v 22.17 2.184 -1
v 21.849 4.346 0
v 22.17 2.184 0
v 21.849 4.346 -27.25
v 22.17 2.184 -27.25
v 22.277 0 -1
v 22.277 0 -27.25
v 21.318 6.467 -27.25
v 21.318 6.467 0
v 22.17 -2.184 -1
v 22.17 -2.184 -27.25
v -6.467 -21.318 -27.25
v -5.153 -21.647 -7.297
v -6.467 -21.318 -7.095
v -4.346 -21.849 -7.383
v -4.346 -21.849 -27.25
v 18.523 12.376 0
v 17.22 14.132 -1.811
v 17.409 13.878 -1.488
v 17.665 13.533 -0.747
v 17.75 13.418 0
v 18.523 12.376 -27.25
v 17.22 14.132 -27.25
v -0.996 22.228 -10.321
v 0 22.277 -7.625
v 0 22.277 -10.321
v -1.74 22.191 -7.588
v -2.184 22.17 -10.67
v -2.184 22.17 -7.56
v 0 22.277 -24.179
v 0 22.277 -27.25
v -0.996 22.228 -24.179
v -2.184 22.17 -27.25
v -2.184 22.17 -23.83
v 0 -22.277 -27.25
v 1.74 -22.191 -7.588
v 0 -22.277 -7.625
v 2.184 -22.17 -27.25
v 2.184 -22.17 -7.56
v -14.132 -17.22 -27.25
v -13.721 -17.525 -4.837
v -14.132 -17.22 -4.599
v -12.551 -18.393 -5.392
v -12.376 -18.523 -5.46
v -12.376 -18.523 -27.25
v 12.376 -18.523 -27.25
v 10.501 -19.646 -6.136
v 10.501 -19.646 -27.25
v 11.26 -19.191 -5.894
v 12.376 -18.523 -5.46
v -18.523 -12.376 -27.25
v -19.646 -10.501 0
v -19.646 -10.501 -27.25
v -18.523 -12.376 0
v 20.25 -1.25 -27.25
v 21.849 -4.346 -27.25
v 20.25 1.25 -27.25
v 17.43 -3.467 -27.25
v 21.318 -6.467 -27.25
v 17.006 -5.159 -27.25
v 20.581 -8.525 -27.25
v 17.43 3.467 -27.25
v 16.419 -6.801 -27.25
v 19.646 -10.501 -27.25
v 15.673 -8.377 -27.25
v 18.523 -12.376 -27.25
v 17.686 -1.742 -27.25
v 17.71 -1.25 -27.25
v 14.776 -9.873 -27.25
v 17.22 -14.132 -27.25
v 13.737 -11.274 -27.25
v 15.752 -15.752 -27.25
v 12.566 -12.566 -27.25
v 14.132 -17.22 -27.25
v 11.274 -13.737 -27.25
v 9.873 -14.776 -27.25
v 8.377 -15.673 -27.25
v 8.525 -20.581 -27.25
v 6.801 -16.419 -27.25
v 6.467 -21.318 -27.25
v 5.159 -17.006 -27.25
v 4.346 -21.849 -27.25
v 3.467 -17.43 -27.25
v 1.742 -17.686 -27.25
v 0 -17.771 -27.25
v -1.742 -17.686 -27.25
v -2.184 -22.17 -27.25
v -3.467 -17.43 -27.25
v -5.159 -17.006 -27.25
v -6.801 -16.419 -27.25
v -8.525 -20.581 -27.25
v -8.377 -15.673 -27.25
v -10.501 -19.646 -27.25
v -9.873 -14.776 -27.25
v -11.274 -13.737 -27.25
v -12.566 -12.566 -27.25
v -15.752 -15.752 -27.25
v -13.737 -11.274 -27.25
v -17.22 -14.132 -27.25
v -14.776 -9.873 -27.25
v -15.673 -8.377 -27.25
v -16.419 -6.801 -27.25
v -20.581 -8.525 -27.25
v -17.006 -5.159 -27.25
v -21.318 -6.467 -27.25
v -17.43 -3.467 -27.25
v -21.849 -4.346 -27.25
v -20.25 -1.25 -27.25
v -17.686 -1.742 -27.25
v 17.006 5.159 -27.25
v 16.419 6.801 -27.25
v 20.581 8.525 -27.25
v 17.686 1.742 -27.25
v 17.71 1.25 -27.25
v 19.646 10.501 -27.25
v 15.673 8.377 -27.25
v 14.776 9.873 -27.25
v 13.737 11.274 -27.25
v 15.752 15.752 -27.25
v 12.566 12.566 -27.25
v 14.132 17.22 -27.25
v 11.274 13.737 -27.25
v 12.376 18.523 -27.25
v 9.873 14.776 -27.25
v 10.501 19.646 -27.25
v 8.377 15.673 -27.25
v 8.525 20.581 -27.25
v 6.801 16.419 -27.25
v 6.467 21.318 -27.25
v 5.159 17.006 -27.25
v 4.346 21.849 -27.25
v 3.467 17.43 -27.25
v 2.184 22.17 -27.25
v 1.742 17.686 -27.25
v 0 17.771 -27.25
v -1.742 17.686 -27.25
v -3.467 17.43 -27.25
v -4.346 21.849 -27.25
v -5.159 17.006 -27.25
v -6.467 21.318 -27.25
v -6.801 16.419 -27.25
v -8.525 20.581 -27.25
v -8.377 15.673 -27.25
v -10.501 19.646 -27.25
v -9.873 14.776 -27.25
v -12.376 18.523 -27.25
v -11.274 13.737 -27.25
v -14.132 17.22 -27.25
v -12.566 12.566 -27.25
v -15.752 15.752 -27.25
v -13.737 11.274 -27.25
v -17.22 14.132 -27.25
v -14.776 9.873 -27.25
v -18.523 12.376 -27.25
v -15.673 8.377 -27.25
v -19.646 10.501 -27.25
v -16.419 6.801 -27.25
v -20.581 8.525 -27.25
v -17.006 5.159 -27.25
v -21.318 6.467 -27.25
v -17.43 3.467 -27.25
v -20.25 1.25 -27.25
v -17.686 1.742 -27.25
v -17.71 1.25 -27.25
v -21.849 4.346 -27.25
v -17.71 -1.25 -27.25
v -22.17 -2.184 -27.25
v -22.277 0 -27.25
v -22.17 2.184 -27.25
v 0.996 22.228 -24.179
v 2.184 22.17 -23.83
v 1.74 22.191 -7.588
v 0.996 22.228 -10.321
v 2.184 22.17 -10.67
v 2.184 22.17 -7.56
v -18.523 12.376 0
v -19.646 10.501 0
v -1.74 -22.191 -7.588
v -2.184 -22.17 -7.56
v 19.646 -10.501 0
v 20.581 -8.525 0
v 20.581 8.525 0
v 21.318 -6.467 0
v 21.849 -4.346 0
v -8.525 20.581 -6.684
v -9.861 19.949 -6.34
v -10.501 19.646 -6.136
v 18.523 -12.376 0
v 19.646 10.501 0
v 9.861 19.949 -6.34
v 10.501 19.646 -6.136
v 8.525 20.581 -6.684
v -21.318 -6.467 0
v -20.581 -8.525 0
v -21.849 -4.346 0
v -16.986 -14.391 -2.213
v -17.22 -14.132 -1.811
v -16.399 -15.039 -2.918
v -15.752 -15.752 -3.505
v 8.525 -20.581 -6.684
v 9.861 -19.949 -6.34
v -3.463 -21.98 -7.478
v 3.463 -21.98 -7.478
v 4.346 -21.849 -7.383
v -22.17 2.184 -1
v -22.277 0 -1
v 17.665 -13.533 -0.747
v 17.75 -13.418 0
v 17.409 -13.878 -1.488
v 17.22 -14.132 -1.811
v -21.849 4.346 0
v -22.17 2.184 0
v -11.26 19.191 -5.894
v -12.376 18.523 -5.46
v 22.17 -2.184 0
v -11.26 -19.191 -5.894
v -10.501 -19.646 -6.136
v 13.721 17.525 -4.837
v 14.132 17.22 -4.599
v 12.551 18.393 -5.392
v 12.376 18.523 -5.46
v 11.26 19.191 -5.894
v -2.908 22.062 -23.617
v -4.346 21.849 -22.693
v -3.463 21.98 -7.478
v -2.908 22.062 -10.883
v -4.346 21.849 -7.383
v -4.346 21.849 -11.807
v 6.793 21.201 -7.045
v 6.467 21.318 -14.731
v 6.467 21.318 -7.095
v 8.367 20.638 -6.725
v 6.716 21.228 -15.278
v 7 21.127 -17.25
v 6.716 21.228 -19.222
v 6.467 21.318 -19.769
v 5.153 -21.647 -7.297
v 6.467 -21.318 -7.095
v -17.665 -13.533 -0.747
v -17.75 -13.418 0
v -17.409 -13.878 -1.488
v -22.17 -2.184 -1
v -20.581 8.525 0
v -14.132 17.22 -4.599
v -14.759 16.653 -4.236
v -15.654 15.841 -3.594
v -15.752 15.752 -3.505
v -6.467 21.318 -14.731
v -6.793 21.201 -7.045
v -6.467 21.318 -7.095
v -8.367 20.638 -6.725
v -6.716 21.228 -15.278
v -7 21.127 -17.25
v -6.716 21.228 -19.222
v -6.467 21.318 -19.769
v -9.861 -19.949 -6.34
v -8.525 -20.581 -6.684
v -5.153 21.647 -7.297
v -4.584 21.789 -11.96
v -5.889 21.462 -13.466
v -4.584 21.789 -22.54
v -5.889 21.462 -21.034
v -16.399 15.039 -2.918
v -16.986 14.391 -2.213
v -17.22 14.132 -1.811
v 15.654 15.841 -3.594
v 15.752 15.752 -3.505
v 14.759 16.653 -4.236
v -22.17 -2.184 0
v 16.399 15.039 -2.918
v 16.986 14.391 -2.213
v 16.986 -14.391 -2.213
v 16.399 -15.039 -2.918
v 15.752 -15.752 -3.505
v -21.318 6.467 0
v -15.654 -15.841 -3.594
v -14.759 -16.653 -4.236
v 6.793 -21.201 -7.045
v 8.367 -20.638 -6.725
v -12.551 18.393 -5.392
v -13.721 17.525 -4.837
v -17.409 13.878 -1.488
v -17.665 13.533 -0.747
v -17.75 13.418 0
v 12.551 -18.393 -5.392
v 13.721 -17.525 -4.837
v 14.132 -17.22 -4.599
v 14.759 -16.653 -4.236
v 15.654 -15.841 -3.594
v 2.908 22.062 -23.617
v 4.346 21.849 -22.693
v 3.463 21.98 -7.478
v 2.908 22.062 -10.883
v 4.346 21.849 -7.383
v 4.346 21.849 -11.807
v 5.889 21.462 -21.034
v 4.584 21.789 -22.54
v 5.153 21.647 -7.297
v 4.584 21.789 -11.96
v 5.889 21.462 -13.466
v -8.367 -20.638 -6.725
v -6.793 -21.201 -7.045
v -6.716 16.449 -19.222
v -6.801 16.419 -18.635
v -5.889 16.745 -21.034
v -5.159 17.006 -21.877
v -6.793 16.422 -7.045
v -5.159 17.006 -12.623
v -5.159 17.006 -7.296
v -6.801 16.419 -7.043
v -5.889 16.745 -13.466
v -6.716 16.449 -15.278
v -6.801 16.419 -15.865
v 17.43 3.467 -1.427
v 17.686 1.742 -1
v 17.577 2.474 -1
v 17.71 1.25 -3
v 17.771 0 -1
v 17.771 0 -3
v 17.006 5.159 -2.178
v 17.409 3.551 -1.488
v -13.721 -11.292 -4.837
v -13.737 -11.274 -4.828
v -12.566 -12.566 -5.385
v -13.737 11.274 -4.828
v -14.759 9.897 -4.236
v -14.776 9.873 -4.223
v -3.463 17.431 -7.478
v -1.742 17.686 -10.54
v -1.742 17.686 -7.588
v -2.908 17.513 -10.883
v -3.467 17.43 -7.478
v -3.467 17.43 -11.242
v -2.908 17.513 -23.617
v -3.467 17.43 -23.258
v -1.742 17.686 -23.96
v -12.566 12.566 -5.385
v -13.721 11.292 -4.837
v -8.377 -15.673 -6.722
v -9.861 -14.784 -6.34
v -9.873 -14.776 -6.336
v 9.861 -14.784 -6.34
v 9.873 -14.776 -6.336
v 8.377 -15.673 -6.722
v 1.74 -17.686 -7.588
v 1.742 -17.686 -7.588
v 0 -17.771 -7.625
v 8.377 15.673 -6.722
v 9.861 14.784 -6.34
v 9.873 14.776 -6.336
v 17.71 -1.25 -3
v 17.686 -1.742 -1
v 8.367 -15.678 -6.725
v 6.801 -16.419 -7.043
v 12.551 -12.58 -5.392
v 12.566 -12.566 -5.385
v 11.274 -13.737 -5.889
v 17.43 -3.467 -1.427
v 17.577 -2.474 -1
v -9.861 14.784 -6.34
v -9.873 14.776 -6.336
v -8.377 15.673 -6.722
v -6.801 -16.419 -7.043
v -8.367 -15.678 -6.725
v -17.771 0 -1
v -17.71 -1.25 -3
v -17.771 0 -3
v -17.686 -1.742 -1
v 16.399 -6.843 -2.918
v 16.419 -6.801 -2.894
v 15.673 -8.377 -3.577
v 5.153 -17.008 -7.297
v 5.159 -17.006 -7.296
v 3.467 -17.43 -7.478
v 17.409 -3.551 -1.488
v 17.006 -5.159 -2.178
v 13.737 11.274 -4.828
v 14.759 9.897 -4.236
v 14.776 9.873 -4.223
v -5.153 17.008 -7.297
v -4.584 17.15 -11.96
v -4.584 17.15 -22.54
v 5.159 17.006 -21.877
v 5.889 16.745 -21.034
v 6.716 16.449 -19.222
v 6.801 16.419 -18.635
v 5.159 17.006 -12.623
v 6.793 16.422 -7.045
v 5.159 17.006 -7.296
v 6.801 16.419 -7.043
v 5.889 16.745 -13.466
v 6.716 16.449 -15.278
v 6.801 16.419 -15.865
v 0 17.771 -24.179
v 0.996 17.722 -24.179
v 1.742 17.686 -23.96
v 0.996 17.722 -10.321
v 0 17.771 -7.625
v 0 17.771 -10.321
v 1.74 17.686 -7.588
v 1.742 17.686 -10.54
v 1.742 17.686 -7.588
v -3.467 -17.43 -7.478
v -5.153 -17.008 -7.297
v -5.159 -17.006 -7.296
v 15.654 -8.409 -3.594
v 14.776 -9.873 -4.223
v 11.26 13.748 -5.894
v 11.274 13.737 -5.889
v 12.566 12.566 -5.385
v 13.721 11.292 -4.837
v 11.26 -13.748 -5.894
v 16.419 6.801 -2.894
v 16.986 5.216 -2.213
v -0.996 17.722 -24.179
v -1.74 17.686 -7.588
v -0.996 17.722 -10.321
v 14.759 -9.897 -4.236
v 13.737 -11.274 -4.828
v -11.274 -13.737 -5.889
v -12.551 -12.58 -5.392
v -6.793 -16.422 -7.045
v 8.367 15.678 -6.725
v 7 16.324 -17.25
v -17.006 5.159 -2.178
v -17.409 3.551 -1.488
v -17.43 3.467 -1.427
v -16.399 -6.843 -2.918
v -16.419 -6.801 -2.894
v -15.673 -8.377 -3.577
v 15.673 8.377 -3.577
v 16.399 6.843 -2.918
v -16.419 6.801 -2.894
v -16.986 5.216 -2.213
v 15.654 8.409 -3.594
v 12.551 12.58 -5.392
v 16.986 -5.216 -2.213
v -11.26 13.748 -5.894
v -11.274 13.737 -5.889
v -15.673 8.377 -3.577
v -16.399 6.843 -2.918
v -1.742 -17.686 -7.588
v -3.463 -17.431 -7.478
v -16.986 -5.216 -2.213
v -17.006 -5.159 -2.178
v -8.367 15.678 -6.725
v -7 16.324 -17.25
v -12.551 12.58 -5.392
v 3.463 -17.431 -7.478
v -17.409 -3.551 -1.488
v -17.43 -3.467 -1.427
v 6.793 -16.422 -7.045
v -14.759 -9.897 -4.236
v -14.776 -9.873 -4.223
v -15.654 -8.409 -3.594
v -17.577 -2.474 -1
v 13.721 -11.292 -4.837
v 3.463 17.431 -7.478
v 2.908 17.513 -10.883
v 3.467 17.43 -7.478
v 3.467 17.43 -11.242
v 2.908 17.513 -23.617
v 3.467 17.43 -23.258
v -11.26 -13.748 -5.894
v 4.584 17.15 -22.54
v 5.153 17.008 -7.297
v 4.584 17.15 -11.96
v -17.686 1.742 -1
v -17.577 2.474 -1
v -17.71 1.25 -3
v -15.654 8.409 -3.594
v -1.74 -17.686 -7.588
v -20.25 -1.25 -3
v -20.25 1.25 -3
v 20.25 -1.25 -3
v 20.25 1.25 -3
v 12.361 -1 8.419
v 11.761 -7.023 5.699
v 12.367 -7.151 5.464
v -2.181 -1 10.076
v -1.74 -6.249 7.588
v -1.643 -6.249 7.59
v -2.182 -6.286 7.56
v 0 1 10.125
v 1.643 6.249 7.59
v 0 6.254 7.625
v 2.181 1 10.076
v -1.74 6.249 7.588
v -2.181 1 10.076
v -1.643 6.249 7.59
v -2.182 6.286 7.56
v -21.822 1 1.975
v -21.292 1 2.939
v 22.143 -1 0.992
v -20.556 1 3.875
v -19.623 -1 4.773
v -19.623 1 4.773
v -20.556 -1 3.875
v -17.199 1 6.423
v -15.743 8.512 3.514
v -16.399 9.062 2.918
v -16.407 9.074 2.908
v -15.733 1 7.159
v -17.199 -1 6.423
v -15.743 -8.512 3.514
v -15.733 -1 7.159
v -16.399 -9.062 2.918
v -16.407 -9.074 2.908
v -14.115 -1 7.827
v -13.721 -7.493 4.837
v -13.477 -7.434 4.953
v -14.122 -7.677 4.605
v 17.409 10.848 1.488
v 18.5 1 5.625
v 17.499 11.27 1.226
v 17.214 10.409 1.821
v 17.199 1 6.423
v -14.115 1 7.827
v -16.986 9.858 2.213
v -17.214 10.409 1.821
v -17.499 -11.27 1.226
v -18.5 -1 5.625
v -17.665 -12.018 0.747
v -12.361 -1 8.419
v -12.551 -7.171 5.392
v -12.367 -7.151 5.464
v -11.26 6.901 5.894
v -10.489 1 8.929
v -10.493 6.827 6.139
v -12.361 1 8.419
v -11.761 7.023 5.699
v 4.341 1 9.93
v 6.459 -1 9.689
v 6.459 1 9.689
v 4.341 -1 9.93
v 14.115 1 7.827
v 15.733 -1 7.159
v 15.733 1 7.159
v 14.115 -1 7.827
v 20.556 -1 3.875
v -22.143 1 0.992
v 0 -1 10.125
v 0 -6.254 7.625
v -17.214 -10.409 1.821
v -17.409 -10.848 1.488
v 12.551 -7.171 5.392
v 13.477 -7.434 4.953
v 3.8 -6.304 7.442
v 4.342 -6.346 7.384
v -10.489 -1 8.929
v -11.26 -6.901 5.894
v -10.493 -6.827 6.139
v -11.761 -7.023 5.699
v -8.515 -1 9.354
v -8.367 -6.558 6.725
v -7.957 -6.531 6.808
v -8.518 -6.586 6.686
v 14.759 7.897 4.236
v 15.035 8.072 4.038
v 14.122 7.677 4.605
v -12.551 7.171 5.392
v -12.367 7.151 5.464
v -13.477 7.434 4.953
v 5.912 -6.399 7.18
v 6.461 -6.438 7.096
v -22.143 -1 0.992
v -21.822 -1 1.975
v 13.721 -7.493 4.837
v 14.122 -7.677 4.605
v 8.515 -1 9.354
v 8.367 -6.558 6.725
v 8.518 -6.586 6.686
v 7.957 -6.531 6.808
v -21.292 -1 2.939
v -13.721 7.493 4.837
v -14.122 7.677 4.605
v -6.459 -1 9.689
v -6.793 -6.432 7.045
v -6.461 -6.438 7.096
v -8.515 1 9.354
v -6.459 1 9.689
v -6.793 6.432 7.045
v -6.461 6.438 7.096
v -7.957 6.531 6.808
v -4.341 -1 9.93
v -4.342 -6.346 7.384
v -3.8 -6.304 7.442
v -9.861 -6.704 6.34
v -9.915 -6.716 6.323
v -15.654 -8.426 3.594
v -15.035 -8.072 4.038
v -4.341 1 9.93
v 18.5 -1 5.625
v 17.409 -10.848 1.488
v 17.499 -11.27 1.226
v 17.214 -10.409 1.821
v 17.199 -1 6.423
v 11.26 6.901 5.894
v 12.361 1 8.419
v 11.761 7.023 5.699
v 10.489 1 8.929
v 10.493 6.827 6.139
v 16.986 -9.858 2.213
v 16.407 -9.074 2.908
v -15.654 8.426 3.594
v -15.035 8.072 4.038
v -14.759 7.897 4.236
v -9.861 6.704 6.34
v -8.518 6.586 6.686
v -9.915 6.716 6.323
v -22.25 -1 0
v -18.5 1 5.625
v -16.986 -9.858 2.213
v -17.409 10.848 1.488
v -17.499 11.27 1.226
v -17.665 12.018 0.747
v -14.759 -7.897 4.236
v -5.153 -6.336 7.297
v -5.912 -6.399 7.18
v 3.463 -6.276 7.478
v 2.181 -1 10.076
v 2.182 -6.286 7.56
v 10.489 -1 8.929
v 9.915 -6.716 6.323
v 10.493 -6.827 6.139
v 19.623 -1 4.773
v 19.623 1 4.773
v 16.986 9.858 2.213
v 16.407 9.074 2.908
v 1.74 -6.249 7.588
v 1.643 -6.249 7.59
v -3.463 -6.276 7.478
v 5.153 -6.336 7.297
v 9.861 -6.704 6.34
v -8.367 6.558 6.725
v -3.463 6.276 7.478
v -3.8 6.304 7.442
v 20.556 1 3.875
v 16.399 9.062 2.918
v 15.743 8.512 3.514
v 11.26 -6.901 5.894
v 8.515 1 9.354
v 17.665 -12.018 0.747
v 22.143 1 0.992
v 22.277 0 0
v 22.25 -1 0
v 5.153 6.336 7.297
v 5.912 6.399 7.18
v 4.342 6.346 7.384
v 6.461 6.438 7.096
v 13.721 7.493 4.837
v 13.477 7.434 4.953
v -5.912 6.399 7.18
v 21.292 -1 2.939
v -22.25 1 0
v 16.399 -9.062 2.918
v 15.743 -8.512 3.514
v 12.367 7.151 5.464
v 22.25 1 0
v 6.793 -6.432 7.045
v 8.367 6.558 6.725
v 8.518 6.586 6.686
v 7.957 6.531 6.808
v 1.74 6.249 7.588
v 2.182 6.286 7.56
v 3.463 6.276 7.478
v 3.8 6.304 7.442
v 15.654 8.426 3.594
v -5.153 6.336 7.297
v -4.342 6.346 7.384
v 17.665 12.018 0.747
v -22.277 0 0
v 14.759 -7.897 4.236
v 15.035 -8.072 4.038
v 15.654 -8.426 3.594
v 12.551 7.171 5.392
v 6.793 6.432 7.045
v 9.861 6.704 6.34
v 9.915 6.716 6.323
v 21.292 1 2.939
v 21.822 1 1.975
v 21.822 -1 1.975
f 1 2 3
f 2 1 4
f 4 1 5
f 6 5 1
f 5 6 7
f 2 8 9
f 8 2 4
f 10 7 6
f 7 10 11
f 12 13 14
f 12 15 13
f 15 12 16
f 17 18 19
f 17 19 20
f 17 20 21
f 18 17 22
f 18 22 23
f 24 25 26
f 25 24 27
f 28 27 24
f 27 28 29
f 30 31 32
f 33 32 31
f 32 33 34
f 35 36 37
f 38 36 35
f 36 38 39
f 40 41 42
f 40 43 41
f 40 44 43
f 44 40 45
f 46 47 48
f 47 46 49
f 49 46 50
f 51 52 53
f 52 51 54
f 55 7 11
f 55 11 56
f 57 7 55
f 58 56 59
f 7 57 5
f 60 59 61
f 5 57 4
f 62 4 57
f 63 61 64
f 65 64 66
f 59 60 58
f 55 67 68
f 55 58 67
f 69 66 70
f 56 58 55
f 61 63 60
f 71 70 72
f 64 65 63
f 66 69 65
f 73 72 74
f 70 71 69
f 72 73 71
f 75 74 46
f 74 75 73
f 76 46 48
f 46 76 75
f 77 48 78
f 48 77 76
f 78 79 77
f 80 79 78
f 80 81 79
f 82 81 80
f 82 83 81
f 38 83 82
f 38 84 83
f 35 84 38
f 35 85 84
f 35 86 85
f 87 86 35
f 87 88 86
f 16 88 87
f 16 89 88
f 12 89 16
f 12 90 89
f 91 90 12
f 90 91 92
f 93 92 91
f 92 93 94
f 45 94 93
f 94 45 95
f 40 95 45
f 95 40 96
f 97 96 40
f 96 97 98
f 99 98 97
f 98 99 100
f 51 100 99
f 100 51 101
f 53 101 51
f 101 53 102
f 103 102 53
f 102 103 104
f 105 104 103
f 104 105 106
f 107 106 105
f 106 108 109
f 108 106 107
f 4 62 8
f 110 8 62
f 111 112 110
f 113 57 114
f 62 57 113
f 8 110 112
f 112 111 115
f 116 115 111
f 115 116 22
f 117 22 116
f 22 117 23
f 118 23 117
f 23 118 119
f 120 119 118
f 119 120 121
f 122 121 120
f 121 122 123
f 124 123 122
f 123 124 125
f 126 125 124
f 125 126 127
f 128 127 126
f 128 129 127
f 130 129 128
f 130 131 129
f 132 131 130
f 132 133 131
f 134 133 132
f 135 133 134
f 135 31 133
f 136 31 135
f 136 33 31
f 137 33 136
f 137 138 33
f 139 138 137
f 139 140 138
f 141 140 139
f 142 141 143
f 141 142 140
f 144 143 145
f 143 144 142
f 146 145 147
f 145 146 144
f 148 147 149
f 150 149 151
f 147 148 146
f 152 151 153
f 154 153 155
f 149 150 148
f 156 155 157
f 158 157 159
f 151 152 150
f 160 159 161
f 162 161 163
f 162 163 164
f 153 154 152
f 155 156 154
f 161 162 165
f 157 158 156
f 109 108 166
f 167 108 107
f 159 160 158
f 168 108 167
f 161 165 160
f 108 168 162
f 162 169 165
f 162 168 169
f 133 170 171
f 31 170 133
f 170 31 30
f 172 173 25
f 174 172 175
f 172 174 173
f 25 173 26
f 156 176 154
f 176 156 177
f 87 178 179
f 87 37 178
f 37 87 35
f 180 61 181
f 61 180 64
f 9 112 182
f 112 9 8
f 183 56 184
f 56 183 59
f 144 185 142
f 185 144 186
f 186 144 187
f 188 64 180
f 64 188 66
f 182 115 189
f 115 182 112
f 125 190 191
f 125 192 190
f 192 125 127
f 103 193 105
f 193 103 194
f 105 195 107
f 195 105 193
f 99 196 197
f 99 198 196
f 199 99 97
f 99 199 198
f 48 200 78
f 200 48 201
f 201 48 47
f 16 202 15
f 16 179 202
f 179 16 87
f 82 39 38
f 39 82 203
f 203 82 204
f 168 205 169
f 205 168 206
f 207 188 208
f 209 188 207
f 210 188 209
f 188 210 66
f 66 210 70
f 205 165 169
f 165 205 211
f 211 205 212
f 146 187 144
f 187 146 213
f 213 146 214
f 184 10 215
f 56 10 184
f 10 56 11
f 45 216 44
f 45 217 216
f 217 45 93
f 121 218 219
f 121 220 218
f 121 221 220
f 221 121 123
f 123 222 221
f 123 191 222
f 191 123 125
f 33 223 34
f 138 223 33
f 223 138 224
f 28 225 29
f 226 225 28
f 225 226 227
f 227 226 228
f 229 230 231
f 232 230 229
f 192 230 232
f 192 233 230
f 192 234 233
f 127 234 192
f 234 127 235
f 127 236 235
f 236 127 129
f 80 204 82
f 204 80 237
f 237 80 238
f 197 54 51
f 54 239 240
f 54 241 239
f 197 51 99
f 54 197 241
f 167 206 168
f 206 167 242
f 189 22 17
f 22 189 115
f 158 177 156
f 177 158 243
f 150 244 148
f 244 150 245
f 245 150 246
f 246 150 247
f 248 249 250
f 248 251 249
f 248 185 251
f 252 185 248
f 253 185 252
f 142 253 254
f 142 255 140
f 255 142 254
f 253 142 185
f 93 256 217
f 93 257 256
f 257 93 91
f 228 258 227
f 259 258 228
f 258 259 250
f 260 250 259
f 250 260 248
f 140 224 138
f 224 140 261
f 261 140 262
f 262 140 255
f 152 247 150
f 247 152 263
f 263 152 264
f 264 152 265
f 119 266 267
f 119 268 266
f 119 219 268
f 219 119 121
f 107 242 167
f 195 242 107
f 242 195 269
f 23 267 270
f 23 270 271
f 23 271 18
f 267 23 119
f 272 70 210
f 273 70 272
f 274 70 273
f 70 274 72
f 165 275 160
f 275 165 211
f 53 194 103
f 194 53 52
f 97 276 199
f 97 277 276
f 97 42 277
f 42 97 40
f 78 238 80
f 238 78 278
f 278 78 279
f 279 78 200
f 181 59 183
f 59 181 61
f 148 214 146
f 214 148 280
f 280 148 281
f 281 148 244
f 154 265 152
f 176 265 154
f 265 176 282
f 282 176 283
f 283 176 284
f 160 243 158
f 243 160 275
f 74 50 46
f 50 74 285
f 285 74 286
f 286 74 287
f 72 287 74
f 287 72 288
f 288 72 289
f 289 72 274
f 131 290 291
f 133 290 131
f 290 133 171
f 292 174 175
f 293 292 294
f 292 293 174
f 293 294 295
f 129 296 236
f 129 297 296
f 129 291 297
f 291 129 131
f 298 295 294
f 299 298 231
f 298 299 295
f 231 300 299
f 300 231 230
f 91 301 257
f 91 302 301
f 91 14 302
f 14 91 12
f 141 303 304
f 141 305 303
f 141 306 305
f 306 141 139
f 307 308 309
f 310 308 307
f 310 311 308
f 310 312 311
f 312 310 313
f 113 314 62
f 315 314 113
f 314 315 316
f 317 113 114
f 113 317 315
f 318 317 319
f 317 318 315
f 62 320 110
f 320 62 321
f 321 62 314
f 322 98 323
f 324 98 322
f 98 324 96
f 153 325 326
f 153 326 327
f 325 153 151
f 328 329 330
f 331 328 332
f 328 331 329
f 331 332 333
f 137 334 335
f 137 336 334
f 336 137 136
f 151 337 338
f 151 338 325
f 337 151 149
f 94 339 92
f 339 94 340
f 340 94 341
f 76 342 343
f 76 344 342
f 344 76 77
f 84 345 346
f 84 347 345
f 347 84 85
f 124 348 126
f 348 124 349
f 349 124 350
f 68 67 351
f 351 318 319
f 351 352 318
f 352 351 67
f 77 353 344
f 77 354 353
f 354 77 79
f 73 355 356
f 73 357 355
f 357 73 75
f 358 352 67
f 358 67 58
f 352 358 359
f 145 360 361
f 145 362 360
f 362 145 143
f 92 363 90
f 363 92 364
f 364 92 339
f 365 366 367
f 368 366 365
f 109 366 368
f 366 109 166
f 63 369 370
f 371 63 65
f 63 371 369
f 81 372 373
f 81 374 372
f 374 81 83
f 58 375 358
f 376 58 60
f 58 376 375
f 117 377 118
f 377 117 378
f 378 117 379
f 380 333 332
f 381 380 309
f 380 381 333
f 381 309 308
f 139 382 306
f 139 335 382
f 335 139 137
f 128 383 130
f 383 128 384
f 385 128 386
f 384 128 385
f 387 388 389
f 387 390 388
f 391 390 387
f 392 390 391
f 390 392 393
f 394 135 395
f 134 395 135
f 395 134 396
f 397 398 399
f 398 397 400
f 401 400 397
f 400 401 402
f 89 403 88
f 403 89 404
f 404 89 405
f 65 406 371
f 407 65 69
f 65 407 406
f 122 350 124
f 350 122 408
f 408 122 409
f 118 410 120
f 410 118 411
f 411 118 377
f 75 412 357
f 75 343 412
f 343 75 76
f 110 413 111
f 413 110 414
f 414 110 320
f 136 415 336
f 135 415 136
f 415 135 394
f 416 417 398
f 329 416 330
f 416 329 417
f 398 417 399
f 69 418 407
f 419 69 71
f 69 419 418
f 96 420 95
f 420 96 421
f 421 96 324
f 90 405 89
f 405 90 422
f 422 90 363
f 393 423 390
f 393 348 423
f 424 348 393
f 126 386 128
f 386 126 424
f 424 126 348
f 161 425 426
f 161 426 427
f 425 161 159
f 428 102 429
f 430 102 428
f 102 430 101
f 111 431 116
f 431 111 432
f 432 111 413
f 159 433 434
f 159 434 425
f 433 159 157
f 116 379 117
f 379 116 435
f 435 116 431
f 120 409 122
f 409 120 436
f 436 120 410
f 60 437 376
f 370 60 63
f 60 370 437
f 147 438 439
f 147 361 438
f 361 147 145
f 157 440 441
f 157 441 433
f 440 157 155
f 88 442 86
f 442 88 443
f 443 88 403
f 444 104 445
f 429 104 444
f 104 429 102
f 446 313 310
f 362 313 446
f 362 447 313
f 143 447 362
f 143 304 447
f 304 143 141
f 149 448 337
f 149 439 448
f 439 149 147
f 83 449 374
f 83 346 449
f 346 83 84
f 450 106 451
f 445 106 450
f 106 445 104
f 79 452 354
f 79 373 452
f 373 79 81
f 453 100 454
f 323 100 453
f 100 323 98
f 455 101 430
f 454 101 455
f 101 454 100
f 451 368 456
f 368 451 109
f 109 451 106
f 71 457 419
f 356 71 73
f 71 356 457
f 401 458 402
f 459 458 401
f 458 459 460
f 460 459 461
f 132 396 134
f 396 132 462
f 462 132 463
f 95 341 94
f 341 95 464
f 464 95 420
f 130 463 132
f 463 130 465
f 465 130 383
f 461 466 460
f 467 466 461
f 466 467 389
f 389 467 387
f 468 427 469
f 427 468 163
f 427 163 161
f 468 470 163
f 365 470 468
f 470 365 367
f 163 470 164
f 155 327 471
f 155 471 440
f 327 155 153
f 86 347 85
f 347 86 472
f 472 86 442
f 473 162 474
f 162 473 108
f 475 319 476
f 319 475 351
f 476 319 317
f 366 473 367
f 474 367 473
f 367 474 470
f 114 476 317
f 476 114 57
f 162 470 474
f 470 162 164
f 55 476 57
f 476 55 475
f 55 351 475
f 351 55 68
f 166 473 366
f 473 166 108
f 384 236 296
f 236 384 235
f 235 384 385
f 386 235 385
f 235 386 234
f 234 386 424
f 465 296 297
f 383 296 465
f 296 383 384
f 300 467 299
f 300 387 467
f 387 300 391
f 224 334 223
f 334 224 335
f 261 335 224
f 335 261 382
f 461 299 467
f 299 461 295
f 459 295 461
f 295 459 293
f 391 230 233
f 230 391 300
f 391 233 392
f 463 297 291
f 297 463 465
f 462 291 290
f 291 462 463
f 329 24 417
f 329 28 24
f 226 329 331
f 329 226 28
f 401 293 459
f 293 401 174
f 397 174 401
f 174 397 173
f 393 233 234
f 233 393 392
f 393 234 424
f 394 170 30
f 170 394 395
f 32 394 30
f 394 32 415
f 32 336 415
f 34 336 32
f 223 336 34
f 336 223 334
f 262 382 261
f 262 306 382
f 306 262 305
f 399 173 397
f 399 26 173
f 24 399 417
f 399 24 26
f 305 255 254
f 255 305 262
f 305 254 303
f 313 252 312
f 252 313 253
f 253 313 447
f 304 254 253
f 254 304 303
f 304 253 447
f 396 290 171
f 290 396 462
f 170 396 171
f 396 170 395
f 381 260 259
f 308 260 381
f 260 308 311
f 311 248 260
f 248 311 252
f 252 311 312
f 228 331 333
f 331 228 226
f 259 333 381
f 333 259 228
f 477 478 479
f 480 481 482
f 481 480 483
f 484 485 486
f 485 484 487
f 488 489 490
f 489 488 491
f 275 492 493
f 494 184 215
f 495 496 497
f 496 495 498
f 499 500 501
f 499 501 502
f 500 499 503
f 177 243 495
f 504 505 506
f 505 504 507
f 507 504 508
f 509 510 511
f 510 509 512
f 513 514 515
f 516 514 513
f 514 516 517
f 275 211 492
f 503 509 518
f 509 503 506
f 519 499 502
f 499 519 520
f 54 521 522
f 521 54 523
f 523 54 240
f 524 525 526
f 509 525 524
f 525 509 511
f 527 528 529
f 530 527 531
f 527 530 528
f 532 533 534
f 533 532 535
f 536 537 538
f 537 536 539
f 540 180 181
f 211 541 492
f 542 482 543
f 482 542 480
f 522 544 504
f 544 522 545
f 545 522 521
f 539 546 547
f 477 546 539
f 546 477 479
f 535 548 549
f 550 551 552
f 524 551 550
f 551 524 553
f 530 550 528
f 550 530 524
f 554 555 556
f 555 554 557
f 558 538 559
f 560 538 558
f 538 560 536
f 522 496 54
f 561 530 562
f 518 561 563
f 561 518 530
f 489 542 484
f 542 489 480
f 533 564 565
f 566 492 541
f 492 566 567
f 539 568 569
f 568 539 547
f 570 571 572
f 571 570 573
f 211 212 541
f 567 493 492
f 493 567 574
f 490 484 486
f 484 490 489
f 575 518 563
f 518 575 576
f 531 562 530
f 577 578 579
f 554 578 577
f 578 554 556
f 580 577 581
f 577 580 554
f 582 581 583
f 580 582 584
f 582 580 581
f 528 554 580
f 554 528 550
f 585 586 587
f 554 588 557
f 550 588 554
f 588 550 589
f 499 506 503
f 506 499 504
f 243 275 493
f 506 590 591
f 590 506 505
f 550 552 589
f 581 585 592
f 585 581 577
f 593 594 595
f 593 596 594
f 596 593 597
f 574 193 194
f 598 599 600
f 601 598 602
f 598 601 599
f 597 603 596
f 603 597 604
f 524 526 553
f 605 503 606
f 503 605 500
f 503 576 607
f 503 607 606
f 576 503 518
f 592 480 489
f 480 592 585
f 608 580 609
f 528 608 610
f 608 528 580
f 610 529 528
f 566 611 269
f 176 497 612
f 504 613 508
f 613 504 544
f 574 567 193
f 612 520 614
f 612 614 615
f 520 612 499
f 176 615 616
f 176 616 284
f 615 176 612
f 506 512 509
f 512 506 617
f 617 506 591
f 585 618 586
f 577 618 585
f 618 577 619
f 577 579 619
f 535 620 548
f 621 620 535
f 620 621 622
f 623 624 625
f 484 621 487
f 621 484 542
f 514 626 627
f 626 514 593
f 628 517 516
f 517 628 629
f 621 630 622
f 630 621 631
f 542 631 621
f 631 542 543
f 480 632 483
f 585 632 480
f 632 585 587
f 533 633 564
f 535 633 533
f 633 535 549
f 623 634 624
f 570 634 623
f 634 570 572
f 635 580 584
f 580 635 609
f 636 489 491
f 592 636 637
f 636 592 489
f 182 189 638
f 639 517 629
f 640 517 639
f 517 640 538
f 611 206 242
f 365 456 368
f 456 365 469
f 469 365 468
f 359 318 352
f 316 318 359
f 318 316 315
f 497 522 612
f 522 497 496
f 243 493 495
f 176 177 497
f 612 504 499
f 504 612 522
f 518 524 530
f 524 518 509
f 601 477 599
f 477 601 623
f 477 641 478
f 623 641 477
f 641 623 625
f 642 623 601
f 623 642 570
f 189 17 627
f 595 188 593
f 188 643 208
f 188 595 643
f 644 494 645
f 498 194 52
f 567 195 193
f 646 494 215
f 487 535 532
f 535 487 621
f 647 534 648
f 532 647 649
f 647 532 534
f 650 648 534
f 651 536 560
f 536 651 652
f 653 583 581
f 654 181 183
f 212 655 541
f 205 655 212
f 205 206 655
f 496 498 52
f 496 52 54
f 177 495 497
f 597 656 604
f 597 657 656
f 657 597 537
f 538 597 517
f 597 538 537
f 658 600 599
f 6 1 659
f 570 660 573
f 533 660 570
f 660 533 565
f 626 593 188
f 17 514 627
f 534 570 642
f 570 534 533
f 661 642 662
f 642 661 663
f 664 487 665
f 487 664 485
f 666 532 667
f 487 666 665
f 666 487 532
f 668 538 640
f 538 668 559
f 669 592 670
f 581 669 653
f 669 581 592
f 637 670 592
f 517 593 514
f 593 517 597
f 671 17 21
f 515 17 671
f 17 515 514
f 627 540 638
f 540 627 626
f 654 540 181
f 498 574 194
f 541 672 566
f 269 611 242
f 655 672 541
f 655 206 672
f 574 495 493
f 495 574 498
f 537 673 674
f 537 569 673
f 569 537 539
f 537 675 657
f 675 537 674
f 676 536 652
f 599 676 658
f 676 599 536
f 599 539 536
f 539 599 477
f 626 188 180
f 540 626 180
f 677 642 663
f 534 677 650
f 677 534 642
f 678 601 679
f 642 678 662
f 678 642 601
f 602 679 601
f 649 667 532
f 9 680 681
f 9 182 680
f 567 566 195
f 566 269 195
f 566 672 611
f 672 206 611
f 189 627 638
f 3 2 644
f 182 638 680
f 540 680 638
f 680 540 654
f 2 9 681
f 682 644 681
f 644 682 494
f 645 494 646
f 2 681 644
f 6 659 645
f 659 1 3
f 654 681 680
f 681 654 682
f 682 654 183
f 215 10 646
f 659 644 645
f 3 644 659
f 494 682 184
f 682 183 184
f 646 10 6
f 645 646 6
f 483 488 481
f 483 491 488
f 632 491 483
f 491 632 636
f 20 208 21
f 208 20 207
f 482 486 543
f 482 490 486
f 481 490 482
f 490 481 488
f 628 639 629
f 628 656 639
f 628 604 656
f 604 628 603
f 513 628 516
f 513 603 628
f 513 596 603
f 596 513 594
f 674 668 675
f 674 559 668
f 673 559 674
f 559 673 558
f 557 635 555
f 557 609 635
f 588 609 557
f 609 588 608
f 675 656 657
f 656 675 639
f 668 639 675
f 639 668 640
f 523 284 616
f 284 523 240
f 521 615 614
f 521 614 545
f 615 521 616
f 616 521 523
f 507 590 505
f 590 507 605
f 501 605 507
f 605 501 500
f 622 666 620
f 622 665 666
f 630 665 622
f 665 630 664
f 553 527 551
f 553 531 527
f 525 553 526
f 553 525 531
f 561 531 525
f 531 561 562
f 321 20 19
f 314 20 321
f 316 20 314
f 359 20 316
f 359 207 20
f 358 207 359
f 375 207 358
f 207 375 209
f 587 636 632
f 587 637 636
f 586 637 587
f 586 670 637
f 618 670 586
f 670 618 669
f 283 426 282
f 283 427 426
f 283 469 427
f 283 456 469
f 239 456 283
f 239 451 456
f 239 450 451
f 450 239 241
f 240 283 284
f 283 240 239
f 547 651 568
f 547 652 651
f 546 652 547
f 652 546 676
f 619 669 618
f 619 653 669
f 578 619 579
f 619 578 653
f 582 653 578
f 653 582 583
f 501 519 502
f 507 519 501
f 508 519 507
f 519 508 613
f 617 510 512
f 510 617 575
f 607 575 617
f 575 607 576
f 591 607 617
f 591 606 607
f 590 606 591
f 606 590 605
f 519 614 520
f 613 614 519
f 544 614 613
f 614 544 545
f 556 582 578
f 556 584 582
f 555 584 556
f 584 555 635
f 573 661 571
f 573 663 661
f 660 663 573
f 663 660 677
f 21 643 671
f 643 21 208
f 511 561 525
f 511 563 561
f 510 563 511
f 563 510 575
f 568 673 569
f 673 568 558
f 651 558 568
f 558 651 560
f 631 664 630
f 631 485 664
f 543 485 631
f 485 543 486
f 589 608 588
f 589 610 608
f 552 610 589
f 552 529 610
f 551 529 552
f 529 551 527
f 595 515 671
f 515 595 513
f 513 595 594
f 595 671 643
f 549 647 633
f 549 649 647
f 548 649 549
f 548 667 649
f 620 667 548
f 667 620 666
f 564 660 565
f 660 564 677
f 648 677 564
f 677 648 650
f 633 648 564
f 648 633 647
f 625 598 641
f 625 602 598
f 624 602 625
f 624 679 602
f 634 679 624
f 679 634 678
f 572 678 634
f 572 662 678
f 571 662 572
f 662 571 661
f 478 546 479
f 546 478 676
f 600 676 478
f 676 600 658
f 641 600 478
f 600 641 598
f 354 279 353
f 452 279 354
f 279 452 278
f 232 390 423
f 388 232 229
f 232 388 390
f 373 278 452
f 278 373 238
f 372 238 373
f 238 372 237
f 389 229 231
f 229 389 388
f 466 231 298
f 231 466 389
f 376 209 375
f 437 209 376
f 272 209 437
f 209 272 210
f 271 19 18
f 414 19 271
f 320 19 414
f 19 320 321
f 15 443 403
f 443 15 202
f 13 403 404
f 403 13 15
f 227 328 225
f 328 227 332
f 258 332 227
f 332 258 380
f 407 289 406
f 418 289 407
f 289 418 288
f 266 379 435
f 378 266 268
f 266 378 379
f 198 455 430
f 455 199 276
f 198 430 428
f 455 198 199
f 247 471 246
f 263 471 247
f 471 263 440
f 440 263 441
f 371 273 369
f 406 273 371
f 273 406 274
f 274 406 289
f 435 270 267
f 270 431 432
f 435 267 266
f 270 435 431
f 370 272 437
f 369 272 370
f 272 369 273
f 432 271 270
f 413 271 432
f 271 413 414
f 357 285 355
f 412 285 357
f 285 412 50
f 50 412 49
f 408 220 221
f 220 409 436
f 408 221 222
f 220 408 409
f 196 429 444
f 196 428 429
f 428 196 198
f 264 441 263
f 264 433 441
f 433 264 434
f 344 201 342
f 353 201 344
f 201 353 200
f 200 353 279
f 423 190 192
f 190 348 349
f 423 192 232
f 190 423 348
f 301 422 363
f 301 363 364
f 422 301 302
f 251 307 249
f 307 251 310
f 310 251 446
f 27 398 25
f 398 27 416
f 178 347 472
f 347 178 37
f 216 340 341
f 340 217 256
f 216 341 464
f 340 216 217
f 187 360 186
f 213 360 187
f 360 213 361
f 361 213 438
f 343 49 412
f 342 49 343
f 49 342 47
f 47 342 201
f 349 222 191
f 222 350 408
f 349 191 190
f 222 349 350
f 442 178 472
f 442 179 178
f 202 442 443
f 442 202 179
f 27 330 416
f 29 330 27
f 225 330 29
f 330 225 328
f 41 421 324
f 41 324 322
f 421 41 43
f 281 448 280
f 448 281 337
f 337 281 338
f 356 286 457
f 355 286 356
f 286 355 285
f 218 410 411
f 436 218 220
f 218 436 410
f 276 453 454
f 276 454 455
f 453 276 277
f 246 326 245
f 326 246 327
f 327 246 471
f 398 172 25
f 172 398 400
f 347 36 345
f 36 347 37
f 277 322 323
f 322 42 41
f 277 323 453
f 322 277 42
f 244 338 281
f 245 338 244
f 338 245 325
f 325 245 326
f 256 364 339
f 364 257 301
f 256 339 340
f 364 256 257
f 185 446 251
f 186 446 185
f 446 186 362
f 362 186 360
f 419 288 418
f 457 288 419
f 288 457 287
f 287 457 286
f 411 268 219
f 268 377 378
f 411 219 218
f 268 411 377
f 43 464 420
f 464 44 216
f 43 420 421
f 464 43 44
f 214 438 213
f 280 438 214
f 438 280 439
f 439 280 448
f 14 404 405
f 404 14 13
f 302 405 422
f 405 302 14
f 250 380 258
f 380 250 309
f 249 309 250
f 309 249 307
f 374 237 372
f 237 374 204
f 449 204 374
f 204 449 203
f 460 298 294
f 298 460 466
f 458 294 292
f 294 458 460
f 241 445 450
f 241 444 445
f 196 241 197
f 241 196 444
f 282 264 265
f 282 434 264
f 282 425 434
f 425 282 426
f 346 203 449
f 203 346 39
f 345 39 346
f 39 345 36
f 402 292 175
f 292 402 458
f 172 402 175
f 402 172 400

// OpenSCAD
module cylinder_outer(height,radius,fn) {
   fudge = 1/cos(180/fn);
   cylinder(h=height,r=radius*fudge,$fn=fn);
}

VACUUM_DIAM_WITH_SLOTS = 40.5;
VACUUM_DIAM=35.5;
LIP_DEPTH=3;
VACUUM_DEPTH=24.25 + LIP_DEPTH;
SLOT_WIDTH=2.5;
BUTTON_DIAM=14;
SLOT_RECESS=3;


SCALE_ELLIPSE = VACUUM_DIAM / (VACUUM_DEPTH - (LIP_DEPTH * 4));
SCALE_ELLIPSE_BIG = (VACUUM_DIAM_WITH_SLOTS + 4) / (VACUUM_DEPTH - (LIP_DEPTH * 4) + (VACUUM_DIAM_WITH_SLOTS - VACUUM_DIAM));

module arch() {
    intersection() {
        rotate([90, 0, 0]) linear_extrude(height=100, center=true) scale([  SCALE_ELLIPSE_BIG, 1, 1]) circle(d=VACUUM_DEPTH - (LIP_DEPTH * 4) + (VACUUM_DIAM_WITH_SLOTS - VACUUM_DIAM), $fn=64);
        translate([0, 1, (VACUUM_DIAM_WITH_SLOTS + 4) * 0.5]) rotate([90, 0, 0]) linear_extrude(height=2) square([VACUUM_DIAM_WITH_SLOTS + 4, VACUUM_DIAM_WITH_SLOTS + 4], center=true);                 
    }
}

module bottom() {
    translate([0, 0, -1 * VACUUM_DEPTH]) {
        difference() {
            difference() {
                difference() {   
                    cylinder_outer(VACUUM_DEPTH, (VACUUM_DIAM_WITH_SLOTS + 4) / 2, 64);
                    cylinder_outer(VACUUM_DEPTH, VACUUM_DIAM / 2, 64);
                }
                linear_extrude(height=VACUUM_DEPTH - SLOT_RECESS) {
                    square([VACUUM_DIAM_WITH_SLOTS, SLOT_WIDTH], center=true);
              };
            }
            translate([0, 0, (BUTTON_DIAM/2) + LIP_DEPTH]) rotate([-90, 0, 0]) cylinder(d=BUTTON_DIAM, h=30);
        }
    }
}

// slice top of bottom
module hook() {
    difference() {
        hull() {
            intersection() {
                bottom();
                translate([0, 0, -1]) cylinder_outer(1, (VACUUM_DIAM_WITH_SLOTS + 4) / 2, 64);
            }
            arch();
        }
        rotate([90, 0, 0]) linear_extrude(height=100, center=true) scale([SCALE_ELLIPSE, 1, 1]) circle(d=VACUUM_DEPTH - (LIP_DEPTH * 4), $fn=64);
    }
}

difference() {
    union() {
        bottom();
        hook();
    }
    rotate([90, 0, 0]) linear_extrude(height=100, center=true) scale([SCALE_ELLIPSE, 1, 1]) circle(d=VACUUM_DEPTH - (LIP_DEPTH * 4), $fn=64);
}
